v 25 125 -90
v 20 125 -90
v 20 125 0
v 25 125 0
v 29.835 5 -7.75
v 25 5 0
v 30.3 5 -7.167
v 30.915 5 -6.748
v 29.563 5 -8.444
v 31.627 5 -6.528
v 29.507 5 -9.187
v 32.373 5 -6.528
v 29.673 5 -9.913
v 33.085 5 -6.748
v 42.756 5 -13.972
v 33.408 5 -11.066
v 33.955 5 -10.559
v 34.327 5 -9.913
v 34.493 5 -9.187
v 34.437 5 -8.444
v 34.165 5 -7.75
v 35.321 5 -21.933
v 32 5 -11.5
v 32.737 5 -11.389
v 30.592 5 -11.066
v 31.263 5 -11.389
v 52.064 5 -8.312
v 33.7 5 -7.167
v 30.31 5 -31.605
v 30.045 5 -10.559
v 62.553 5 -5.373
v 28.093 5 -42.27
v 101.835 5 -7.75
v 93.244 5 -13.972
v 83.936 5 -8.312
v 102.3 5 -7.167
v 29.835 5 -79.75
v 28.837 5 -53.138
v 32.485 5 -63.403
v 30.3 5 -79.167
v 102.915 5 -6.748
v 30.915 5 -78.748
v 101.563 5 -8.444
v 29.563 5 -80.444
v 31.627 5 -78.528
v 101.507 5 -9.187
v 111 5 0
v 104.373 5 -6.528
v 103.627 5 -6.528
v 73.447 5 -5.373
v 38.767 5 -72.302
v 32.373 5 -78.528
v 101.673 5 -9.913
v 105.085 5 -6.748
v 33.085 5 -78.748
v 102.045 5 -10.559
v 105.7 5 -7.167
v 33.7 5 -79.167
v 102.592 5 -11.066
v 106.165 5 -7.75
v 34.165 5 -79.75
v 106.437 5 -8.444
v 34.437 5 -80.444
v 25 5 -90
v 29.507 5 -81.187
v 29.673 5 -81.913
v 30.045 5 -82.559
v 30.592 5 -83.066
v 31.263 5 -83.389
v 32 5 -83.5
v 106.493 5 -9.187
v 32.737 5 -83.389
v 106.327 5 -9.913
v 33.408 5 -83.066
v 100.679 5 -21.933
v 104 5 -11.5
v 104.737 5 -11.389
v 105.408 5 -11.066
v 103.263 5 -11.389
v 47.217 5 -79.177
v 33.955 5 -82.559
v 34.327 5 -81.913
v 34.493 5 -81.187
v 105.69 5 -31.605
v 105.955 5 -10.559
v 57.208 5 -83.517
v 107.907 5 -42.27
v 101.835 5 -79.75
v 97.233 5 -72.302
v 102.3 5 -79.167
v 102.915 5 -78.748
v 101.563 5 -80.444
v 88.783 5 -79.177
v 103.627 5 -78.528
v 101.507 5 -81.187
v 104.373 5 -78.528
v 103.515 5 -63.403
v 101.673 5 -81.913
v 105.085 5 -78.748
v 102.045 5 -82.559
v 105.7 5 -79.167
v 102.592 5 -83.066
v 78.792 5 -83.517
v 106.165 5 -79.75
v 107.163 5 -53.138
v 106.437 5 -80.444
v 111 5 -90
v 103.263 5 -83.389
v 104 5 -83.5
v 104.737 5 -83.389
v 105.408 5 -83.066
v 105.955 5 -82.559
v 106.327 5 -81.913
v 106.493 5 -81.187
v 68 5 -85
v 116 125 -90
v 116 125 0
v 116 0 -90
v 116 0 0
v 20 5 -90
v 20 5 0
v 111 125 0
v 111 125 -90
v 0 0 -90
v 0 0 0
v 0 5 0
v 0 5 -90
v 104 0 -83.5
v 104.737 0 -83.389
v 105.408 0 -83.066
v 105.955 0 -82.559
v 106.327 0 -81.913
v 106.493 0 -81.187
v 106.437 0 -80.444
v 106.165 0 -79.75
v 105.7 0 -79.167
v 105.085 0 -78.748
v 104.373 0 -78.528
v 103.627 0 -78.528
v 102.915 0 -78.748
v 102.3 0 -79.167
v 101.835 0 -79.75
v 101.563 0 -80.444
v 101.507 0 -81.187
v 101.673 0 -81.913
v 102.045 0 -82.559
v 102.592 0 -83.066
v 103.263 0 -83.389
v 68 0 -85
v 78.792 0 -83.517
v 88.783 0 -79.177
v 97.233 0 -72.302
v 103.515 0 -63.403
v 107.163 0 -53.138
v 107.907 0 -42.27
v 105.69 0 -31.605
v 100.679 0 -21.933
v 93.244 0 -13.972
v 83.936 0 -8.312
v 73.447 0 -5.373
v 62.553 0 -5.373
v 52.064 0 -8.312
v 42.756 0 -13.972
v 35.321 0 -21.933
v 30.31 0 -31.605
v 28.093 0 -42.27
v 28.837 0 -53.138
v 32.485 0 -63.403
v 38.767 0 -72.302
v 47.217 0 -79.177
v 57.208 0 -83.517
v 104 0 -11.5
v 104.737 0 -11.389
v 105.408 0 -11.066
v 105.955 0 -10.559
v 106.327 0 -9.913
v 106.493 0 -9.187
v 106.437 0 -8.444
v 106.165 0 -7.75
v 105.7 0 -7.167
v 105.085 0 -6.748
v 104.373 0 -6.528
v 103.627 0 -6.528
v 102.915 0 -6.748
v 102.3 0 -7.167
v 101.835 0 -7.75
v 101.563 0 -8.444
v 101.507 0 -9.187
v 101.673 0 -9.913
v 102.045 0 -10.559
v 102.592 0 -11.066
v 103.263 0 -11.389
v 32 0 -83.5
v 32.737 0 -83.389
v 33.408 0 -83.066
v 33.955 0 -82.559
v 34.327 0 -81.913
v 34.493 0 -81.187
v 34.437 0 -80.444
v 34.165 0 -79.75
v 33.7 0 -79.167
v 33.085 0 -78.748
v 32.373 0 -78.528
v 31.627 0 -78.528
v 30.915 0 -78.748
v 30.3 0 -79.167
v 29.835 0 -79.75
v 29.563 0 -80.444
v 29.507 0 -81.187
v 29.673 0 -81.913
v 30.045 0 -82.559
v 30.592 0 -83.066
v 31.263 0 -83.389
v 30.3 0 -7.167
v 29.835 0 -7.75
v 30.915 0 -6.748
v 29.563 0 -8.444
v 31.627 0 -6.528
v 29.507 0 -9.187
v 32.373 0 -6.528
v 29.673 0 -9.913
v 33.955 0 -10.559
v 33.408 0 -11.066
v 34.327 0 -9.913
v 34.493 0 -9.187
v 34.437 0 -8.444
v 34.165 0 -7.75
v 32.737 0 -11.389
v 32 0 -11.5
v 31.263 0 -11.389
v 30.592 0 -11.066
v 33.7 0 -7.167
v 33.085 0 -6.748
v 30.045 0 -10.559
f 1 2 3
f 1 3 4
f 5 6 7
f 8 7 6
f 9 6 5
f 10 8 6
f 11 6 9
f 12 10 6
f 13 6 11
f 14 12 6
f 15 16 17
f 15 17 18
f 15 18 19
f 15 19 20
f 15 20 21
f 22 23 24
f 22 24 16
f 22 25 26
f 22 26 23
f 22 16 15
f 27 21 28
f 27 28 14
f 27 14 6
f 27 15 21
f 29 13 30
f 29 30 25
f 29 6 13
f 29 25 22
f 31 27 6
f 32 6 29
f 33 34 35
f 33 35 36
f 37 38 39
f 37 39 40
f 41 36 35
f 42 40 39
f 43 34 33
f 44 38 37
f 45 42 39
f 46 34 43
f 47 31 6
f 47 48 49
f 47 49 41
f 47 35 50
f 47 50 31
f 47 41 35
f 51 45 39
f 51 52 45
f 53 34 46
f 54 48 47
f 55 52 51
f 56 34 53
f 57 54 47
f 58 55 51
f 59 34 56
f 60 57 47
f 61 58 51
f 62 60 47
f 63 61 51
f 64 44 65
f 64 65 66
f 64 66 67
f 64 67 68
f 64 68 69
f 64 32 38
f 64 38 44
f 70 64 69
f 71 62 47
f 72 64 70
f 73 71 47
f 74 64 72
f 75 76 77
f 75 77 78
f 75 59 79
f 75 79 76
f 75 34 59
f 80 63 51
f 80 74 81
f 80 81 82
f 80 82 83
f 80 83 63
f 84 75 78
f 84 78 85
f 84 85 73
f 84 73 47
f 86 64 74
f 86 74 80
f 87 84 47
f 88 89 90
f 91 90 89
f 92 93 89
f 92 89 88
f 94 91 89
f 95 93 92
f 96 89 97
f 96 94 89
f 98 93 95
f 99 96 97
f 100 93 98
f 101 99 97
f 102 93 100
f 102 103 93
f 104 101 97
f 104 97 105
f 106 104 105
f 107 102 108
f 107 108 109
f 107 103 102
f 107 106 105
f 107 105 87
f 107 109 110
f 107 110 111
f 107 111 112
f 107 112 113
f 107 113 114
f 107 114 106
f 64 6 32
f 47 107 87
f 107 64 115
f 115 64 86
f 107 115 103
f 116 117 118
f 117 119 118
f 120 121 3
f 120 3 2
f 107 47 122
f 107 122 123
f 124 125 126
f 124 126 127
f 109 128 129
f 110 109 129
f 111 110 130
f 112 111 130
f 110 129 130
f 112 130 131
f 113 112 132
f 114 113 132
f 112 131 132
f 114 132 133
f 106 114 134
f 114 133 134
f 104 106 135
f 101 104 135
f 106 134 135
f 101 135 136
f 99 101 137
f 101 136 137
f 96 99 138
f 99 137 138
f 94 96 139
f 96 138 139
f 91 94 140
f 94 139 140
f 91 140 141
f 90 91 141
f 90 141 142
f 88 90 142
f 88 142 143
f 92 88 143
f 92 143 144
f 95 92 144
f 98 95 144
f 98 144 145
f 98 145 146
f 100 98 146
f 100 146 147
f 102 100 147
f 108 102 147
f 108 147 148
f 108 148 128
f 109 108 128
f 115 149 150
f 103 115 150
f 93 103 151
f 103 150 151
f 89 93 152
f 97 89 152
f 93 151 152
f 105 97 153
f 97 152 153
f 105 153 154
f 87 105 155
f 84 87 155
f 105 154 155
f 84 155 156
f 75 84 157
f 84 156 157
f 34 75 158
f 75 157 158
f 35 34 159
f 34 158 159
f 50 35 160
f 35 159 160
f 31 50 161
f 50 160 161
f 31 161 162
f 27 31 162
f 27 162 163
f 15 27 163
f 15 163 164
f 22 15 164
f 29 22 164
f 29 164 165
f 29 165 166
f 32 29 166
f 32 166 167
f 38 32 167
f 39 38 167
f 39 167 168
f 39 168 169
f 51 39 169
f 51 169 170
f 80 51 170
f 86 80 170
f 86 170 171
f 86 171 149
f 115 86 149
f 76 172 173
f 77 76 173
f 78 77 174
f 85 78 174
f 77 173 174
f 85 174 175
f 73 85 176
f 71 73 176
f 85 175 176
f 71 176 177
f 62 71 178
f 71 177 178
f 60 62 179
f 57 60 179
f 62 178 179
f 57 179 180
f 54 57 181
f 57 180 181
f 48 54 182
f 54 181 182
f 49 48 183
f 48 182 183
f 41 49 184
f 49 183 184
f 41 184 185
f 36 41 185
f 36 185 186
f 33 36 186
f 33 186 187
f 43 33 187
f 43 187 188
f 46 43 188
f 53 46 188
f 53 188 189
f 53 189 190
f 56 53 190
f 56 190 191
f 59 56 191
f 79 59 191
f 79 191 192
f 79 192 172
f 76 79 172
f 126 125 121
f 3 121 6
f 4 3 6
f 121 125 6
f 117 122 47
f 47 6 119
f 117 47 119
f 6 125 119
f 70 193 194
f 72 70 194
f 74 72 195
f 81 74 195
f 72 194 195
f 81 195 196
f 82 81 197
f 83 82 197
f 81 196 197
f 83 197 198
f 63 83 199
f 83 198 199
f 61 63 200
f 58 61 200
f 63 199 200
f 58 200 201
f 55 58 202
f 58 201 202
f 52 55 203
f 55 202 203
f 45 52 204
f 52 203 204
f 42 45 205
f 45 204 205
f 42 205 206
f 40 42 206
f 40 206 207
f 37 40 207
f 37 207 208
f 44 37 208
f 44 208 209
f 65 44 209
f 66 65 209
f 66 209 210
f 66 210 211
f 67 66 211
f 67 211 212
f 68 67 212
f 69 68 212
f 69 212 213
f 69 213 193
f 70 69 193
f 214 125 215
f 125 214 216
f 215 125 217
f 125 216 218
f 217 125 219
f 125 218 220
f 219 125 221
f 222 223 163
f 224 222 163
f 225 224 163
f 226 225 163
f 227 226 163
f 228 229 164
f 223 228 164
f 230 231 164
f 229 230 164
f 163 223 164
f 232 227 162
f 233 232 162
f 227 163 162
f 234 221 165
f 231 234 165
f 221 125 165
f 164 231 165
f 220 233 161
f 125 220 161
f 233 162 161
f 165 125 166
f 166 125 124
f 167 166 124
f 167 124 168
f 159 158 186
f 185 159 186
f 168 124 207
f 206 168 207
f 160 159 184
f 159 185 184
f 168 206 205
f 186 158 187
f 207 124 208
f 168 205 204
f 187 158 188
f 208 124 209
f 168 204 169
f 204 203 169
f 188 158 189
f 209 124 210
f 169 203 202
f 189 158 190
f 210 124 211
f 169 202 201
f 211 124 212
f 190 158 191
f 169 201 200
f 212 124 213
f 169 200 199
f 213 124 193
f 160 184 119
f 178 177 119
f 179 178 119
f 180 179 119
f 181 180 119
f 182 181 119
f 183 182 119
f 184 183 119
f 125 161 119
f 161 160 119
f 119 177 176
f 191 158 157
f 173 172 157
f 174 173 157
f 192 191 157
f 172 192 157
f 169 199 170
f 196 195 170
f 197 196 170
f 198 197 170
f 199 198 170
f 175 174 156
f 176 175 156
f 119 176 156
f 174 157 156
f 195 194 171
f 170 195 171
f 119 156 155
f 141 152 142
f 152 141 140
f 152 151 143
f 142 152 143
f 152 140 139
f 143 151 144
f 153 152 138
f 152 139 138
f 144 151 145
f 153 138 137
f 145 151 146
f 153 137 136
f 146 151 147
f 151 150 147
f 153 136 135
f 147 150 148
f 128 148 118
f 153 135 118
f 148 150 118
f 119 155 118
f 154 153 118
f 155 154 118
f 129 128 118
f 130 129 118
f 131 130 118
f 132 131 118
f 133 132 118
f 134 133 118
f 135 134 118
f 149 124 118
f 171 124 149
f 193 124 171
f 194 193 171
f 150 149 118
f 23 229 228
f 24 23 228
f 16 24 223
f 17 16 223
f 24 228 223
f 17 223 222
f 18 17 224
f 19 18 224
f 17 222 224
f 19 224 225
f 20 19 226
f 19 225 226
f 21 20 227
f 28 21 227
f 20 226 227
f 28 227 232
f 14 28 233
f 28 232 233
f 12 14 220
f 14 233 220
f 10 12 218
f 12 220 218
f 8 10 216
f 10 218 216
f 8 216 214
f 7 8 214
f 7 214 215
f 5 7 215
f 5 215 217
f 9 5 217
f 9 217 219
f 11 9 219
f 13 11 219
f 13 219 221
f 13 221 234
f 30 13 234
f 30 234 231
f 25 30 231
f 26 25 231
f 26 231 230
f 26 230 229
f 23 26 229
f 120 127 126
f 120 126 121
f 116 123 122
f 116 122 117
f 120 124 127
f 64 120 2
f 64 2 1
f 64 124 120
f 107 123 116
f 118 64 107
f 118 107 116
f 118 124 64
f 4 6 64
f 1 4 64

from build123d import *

# Parameters (mm, degrees)
SKETCH1_W           = 116
SKETCH1_H           = 90
BOSS_EXTRUDE1_DEPTH = 5
SKETCH2_W           = 5
SKETCH2_H           = 90
BOSS_EXTRUDE2_DEPTH = 120
SKETCH3_R           = 40
CUT_EXTRUDE1_DEPTH  = 15
SKETCH4_R           = 2.5
CUT_EXTRUDE2_DEPTH  = 15
SKETCH5_W           = 5
SKETCH5_H           = 90
BOSS_EXTRUDE3_DEPTH = 120


with BuildPart() as part:
    # Sketch1 → Boss-Extrude1 (new body)
    with BuildSketch(Plane(origin=(0, 0, 0), x_dir=(1, 0, 0), z_dir=(0, 1, 0))):
        with Locations((58, 45)):
            Rectangle(SKETCH1_W, SKETCH1_H)
    extrude(amount=BOSS_EXTRUDE1_DEPTH)

    # Sketch2 → Boss-Extrude2 (add)
    with BuildSketch(Plane(origin=(0, 5, 0), x_dir=(1, 0, 0), z_dir=(0, 1, 0))):
        with Locations((113.5, 45)):
            Rectangle(SKETCH2_W, SKETCH2_H)
    extrude(amount=BOSS_EXTRUDE2_DEPTH)

    # Sketch3 → Cut-Extrude1 (cut)
    with BuildSketch(Plane.XZ):
        with Locations(Location((68, -45, 0), (0, 0, 270))):
            Circle(SKETCH3_R)
    extrude(amount=-CUT_EXTRUDE1_DEPTH, mode=Mode.SUBTRACT)

    # Sketch4 → Cut-Extrude2 (cut)
    with BuildSketch(Plane.XZ):
        with Locations(Location((32, -9, 0), (0, 0, 270))):
            Circle(SKETCH4_R)
        with Locations(Location((104, -9, 0), (0, 0, 270))):
            Circle(SKETCH4_R)
        with Locations(Location((104, -81, 0), (0, 0, 270))):
            Circle(SKETCH4_R)
        with Locations(Location((32, -81, 0), (0, 0, 270))):
            Circle(SKETCH4_R)
    extrude(amount=-CUT_EXTRUDE2_DEPTH, mode=Mode.SUBTRACT)

    # Sketch5 → Boss-Extrude3 (add)
    with BuildSketch(Plane(origin=(0, 5, 0), x_dir=(1, 0, 0), z_dir=(0, 1, 0))):
        with Locations((22.5, 45)):
            Rectangle(SKETCH5_W, SKETCH5_H)
    extrude(amount=BOSS_EXTRUDE3_DEPTH)


solid = part.part
